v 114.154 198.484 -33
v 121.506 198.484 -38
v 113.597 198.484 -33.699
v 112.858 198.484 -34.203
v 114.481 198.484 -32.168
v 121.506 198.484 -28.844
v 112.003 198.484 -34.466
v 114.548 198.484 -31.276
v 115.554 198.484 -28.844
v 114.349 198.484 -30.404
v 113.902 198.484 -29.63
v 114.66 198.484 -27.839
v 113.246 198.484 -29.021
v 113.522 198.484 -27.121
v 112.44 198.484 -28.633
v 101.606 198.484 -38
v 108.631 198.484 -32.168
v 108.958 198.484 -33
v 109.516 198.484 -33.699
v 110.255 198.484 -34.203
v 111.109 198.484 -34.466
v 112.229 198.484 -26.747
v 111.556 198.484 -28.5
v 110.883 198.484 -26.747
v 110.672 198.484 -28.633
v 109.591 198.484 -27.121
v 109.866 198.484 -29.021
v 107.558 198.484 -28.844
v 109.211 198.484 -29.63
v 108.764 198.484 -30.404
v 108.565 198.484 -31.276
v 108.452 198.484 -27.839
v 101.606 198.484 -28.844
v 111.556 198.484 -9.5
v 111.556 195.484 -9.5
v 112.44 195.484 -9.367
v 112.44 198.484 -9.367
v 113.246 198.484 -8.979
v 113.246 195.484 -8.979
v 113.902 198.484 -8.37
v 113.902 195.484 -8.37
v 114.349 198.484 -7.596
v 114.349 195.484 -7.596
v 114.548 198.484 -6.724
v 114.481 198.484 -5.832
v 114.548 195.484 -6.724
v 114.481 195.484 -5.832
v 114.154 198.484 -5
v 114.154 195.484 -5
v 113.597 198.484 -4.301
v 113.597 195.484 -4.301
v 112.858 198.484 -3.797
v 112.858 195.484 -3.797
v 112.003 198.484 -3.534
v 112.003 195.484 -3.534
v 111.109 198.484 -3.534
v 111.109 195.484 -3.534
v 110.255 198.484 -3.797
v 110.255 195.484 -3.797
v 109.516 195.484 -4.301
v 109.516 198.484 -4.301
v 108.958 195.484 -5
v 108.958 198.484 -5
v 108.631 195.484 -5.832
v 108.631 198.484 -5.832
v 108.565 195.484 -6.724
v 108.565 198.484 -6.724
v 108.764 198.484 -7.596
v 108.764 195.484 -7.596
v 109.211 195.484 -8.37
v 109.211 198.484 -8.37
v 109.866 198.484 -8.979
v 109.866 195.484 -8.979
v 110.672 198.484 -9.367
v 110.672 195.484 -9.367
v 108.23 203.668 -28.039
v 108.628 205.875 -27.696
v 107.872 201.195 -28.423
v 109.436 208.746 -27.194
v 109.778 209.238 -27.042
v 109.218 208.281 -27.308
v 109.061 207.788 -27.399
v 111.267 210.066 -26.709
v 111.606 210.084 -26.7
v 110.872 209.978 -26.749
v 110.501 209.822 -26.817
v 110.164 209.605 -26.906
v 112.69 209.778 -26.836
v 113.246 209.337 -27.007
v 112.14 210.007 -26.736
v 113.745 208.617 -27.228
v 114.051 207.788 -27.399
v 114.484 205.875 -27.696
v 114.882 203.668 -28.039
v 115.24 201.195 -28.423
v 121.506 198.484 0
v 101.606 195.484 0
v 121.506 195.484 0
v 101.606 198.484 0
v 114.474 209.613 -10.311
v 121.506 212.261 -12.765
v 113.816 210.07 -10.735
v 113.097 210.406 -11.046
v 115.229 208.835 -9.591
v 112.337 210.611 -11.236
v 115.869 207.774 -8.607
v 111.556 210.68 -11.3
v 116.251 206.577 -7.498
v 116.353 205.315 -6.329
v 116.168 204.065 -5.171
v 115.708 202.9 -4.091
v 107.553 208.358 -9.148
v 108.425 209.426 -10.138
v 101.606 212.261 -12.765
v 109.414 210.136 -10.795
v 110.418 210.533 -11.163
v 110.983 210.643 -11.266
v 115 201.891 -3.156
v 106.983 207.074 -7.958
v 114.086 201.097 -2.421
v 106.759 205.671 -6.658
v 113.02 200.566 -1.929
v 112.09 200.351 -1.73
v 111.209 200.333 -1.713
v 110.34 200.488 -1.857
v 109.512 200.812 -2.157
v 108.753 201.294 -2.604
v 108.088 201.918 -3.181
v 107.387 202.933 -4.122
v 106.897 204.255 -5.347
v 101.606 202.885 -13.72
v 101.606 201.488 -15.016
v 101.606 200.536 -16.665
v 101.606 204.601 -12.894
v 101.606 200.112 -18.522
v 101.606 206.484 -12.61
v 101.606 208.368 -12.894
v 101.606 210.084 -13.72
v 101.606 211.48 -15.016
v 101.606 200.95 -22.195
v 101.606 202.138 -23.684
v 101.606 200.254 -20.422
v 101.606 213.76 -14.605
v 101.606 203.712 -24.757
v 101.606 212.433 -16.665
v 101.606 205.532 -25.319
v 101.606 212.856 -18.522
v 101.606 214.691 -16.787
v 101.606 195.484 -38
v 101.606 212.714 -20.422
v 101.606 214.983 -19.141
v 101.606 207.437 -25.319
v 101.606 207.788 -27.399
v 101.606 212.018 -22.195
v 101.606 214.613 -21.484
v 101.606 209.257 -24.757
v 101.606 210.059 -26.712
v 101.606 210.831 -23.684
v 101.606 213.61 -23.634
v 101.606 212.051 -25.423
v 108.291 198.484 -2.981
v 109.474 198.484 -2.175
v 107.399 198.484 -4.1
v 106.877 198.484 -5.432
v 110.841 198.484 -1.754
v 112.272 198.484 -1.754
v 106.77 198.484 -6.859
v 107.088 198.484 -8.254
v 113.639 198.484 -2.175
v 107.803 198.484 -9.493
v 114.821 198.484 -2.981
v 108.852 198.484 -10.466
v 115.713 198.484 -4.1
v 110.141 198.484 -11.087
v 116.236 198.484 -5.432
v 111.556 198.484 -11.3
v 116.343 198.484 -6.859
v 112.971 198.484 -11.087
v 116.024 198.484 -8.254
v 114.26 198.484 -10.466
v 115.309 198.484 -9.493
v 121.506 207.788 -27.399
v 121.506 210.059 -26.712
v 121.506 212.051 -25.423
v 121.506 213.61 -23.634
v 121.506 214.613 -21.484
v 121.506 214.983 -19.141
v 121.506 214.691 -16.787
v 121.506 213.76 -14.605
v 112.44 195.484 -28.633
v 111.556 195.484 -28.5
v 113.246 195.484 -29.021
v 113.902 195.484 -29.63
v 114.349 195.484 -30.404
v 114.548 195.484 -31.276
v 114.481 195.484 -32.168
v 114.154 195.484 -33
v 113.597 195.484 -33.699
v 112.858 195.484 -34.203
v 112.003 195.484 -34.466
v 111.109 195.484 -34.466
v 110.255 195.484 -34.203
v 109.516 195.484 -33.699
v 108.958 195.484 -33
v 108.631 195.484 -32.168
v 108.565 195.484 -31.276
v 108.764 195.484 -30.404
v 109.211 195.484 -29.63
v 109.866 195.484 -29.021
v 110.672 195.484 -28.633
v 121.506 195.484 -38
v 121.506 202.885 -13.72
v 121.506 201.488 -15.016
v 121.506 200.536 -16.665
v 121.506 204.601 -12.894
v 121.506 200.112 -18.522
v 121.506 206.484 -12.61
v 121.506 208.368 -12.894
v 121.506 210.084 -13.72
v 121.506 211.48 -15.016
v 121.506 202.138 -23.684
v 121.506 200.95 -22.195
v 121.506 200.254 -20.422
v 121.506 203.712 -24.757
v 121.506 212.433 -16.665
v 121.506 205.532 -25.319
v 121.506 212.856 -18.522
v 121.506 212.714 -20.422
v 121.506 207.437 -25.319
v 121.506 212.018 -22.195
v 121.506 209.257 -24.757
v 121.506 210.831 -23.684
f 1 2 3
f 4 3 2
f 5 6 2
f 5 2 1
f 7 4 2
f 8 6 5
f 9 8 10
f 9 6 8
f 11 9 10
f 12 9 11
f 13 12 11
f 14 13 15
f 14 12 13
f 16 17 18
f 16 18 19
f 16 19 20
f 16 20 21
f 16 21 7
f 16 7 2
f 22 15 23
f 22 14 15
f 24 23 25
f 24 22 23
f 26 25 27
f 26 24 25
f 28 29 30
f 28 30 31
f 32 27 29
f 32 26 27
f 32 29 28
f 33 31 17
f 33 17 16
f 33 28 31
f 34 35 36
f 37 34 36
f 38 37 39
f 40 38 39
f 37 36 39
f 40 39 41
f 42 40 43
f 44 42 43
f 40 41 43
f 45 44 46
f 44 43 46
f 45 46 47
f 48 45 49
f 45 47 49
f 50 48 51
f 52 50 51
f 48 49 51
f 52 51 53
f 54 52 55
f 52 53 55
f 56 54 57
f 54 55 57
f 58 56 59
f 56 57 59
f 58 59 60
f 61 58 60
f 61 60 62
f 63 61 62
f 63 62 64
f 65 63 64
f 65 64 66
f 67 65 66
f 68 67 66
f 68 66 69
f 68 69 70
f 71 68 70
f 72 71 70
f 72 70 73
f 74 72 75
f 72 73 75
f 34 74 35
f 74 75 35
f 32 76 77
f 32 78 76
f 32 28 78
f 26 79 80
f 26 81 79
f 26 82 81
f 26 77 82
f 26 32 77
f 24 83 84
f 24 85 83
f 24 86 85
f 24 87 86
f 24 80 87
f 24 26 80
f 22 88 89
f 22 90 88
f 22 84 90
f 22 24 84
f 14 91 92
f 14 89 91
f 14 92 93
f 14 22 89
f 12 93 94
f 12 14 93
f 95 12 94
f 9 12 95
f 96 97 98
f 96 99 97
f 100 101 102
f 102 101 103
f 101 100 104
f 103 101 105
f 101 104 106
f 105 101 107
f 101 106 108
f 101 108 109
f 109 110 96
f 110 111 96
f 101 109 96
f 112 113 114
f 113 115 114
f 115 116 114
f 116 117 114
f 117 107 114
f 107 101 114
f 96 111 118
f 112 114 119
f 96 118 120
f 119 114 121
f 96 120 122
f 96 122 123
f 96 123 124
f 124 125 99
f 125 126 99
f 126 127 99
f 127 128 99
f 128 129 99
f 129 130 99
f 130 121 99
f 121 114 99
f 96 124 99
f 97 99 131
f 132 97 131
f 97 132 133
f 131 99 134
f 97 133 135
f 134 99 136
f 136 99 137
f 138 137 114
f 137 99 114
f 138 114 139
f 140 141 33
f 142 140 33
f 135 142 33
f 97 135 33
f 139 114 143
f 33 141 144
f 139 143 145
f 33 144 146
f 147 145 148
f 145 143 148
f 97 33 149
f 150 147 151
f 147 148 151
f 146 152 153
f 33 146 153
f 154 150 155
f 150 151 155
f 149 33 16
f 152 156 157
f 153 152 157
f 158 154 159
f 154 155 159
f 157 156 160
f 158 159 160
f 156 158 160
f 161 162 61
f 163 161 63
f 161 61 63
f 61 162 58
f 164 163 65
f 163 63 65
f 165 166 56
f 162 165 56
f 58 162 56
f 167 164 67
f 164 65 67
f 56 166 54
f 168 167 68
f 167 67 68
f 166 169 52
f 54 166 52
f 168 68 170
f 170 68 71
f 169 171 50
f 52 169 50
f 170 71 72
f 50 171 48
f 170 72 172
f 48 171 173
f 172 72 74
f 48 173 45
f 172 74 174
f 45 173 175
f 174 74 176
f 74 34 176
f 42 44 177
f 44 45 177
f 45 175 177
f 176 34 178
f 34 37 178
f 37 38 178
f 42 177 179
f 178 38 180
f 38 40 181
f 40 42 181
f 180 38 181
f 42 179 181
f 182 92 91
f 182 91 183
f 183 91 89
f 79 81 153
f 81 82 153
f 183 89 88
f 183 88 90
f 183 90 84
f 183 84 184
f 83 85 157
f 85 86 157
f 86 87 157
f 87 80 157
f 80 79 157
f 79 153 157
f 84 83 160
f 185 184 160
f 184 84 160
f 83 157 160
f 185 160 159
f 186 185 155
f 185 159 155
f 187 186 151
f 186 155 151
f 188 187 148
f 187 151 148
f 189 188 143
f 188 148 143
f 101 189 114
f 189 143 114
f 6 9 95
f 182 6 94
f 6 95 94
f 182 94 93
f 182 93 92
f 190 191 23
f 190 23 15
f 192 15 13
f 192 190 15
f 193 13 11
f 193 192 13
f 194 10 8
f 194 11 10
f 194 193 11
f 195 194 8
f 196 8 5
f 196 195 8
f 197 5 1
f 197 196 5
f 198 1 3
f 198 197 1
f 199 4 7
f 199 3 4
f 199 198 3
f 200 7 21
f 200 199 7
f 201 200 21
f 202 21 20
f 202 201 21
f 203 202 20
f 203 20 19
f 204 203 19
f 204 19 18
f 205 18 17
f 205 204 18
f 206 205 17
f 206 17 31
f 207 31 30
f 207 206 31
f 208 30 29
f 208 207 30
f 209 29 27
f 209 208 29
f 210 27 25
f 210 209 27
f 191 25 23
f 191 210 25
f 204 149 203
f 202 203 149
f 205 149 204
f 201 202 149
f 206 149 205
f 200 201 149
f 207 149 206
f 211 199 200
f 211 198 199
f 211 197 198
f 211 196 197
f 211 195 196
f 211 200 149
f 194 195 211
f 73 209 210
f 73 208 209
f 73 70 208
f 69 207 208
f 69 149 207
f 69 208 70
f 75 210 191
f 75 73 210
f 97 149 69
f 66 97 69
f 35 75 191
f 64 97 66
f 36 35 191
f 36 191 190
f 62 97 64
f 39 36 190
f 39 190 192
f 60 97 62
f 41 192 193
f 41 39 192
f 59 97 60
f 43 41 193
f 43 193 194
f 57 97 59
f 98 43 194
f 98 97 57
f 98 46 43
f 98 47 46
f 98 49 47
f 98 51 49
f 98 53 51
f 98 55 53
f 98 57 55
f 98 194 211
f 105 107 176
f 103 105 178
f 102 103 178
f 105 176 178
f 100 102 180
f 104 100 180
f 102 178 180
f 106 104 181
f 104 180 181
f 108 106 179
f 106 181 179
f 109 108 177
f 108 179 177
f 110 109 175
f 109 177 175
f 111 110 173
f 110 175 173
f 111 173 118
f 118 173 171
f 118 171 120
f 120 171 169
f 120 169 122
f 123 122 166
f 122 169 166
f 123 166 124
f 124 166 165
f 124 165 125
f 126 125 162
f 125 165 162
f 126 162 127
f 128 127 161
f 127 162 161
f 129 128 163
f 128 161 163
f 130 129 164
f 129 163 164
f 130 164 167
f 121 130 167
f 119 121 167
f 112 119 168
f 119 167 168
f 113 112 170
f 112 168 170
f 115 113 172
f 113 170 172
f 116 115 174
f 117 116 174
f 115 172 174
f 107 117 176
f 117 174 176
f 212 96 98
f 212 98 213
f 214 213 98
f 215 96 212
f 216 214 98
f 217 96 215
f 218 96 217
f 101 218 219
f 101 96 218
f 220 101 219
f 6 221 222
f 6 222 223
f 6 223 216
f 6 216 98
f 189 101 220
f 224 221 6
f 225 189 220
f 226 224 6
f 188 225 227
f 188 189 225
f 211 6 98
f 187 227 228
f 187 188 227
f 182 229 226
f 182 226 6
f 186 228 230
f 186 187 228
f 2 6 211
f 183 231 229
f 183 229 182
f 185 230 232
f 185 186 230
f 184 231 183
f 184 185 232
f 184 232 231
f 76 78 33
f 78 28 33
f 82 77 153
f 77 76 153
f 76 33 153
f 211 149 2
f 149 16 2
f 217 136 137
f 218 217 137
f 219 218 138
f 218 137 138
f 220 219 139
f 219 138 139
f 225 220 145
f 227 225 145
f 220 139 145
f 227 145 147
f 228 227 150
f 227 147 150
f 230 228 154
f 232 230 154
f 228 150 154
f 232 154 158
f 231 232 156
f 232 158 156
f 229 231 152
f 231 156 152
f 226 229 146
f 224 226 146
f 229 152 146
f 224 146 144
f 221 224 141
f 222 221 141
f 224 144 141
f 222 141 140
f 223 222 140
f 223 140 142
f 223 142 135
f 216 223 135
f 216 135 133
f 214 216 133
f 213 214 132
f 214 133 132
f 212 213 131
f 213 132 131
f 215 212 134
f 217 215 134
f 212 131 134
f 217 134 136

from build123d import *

# Parameters (mm, degrees)
BOSS_EXTRUDE1_DEPTH = 38
SKETCH2_R           = 6.39
BOSS_EXTRUDE2_DEPTH = 19.9


with BuildPart() as part:
    # Sketch1 → Boss-Extrude1 (new body)
    with BuildSketch(Plane.XY):
        Polygon((101.60617691, 195.484265545), (108.51617691, 195.484265545), (114.604851948, 195.484265545), (121.50617691, 195.484265545), (121.50617691, 198.484265545), (101.60617691, 198.484265545), align=None)
    extrude(amount=-BOSS_EXTRUDE1_DEPTH)

    # Sketch2 → Boss-Extrude2 (add)
    with BuildSketch(Plane.ZY.offset(-101.60617691)):
        with BuildLine():
            Line((-28.843974353, 198.484265545), (-27.399359103, 207.788399993))
            ThreePointArc((-27.399359103, 207.788399993), (-21.484497631, 214.613058291), (-12.764937605, 212.261288734))
            Line((-12.764937605, 212.261288734), (0, 198.484265545))
            Line((0, 198.484265545), (-28.843974353, 198.484265545))
        make_face()
        with Locations((-19, 206.484265545)):
            Circle(SKETCH2_R, mode=Mode.SUBTRACT)
    extrude(amount=-BOSS_EXTRUDE2_DEPTH)

    # Sketch3 → Cut-Revolve1 (revolve, cut)
    with BuildSketch(Plane.ZY.offset(-111.55617691)):
        Polygon((-26.7, 211.670017018), (-26.7, 198.484265545), (-28.5, 198.484265545), (-28.5, 189.906068288), (-31.5, 189.906068288), (-31.5, 211.670017018), align=None)
    cut_revolve1 = revolve(axis=Axis((111.55617691, 189.906068288, -31.5), (0, 1, 0)), mode=Mode.SUBTRACT)

    # Mirror1: Cut-Revolve1 across plane
    add(cut_revolve1.mirror(Plane(origin=(0, 0, -19), x_dir=(1, 0, 0), z_dir=(0, 0, -1))), mode=Mode.SUBTRACT)


solid = part.part
